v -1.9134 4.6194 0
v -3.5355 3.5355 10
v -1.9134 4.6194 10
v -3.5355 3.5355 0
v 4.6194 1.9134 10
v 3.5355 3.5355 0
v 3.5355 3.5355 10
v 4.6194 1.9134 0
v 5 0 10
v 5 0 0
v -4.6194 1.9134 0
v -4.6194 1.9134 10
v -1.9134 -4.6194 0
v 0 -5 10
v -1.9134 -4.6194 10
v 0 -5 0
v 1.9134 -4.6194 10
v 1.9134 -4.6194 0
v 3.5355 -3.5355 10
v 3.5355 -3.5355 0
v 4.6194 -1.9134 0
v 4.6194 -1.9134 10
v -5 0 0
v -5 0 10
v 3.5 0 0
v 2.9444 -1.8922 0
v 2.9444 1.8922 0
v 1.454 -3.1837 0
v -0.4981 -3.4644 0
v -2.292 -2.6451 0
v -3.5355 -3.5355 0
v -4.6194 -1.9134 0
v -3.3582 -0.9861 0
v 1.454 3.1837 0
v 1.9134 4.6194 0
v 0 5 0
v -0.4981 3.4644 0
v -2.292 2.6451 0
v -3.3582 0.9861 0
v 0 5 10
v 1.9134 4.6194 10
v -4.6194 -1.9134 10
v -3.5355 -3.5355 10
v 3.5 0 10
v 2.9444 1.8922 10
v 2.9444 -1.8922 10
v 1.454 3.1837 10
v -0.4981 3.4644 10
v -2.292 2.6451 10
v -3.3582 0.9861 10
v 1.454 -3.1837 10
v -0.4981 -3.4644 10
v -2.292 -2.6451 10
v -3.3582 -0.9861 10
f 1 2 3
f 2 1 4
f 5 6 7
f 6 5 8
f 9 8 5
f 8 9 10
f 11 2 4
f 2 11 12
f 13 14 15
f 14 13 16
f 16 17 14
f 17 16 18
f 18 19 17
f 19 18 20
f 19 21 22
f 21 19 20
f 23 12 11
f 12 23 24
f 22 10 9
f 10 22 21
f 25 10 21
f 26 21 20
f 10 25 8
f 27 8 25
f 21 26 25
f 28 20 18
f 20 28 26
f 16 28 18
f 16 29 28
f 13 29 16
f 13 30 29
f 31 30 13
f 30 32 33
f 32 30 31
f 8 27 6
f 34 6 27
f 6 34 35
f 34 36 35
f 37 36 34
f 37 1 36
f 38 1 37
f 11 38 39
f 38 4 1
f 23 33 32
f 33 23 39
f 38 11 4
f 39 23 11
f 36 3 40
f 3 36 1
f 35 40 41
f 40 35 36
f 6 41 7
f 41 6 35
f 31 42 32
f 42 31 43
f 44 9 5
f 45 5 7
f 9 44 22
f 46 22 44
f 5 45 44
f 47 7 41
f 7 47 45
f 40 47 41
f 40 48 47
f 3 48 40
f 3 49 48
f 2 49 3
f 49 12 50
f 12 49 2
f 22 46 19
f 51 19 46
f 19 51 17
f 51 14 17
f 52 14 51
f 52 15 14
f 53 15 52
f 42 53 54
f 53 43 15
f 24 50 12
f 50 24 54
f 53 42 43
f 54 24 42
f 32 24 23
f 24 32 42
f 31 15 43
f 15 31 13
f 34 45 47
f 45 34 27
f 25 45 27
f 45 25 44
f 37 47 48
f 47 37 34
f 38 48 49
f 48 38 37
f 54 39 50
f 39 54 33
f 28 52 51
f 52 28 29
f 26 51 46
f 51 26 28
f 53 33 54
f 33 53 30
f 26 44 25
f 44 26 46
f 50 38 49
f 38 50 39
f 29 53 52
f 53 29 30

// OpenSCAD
id = 7;
od = 10;
d = 10;

washer();

module washer(){
     difference() {
	  cylinder(h = d, d = od);	       
	  cylinder(h = d, d = id);
     }
}
